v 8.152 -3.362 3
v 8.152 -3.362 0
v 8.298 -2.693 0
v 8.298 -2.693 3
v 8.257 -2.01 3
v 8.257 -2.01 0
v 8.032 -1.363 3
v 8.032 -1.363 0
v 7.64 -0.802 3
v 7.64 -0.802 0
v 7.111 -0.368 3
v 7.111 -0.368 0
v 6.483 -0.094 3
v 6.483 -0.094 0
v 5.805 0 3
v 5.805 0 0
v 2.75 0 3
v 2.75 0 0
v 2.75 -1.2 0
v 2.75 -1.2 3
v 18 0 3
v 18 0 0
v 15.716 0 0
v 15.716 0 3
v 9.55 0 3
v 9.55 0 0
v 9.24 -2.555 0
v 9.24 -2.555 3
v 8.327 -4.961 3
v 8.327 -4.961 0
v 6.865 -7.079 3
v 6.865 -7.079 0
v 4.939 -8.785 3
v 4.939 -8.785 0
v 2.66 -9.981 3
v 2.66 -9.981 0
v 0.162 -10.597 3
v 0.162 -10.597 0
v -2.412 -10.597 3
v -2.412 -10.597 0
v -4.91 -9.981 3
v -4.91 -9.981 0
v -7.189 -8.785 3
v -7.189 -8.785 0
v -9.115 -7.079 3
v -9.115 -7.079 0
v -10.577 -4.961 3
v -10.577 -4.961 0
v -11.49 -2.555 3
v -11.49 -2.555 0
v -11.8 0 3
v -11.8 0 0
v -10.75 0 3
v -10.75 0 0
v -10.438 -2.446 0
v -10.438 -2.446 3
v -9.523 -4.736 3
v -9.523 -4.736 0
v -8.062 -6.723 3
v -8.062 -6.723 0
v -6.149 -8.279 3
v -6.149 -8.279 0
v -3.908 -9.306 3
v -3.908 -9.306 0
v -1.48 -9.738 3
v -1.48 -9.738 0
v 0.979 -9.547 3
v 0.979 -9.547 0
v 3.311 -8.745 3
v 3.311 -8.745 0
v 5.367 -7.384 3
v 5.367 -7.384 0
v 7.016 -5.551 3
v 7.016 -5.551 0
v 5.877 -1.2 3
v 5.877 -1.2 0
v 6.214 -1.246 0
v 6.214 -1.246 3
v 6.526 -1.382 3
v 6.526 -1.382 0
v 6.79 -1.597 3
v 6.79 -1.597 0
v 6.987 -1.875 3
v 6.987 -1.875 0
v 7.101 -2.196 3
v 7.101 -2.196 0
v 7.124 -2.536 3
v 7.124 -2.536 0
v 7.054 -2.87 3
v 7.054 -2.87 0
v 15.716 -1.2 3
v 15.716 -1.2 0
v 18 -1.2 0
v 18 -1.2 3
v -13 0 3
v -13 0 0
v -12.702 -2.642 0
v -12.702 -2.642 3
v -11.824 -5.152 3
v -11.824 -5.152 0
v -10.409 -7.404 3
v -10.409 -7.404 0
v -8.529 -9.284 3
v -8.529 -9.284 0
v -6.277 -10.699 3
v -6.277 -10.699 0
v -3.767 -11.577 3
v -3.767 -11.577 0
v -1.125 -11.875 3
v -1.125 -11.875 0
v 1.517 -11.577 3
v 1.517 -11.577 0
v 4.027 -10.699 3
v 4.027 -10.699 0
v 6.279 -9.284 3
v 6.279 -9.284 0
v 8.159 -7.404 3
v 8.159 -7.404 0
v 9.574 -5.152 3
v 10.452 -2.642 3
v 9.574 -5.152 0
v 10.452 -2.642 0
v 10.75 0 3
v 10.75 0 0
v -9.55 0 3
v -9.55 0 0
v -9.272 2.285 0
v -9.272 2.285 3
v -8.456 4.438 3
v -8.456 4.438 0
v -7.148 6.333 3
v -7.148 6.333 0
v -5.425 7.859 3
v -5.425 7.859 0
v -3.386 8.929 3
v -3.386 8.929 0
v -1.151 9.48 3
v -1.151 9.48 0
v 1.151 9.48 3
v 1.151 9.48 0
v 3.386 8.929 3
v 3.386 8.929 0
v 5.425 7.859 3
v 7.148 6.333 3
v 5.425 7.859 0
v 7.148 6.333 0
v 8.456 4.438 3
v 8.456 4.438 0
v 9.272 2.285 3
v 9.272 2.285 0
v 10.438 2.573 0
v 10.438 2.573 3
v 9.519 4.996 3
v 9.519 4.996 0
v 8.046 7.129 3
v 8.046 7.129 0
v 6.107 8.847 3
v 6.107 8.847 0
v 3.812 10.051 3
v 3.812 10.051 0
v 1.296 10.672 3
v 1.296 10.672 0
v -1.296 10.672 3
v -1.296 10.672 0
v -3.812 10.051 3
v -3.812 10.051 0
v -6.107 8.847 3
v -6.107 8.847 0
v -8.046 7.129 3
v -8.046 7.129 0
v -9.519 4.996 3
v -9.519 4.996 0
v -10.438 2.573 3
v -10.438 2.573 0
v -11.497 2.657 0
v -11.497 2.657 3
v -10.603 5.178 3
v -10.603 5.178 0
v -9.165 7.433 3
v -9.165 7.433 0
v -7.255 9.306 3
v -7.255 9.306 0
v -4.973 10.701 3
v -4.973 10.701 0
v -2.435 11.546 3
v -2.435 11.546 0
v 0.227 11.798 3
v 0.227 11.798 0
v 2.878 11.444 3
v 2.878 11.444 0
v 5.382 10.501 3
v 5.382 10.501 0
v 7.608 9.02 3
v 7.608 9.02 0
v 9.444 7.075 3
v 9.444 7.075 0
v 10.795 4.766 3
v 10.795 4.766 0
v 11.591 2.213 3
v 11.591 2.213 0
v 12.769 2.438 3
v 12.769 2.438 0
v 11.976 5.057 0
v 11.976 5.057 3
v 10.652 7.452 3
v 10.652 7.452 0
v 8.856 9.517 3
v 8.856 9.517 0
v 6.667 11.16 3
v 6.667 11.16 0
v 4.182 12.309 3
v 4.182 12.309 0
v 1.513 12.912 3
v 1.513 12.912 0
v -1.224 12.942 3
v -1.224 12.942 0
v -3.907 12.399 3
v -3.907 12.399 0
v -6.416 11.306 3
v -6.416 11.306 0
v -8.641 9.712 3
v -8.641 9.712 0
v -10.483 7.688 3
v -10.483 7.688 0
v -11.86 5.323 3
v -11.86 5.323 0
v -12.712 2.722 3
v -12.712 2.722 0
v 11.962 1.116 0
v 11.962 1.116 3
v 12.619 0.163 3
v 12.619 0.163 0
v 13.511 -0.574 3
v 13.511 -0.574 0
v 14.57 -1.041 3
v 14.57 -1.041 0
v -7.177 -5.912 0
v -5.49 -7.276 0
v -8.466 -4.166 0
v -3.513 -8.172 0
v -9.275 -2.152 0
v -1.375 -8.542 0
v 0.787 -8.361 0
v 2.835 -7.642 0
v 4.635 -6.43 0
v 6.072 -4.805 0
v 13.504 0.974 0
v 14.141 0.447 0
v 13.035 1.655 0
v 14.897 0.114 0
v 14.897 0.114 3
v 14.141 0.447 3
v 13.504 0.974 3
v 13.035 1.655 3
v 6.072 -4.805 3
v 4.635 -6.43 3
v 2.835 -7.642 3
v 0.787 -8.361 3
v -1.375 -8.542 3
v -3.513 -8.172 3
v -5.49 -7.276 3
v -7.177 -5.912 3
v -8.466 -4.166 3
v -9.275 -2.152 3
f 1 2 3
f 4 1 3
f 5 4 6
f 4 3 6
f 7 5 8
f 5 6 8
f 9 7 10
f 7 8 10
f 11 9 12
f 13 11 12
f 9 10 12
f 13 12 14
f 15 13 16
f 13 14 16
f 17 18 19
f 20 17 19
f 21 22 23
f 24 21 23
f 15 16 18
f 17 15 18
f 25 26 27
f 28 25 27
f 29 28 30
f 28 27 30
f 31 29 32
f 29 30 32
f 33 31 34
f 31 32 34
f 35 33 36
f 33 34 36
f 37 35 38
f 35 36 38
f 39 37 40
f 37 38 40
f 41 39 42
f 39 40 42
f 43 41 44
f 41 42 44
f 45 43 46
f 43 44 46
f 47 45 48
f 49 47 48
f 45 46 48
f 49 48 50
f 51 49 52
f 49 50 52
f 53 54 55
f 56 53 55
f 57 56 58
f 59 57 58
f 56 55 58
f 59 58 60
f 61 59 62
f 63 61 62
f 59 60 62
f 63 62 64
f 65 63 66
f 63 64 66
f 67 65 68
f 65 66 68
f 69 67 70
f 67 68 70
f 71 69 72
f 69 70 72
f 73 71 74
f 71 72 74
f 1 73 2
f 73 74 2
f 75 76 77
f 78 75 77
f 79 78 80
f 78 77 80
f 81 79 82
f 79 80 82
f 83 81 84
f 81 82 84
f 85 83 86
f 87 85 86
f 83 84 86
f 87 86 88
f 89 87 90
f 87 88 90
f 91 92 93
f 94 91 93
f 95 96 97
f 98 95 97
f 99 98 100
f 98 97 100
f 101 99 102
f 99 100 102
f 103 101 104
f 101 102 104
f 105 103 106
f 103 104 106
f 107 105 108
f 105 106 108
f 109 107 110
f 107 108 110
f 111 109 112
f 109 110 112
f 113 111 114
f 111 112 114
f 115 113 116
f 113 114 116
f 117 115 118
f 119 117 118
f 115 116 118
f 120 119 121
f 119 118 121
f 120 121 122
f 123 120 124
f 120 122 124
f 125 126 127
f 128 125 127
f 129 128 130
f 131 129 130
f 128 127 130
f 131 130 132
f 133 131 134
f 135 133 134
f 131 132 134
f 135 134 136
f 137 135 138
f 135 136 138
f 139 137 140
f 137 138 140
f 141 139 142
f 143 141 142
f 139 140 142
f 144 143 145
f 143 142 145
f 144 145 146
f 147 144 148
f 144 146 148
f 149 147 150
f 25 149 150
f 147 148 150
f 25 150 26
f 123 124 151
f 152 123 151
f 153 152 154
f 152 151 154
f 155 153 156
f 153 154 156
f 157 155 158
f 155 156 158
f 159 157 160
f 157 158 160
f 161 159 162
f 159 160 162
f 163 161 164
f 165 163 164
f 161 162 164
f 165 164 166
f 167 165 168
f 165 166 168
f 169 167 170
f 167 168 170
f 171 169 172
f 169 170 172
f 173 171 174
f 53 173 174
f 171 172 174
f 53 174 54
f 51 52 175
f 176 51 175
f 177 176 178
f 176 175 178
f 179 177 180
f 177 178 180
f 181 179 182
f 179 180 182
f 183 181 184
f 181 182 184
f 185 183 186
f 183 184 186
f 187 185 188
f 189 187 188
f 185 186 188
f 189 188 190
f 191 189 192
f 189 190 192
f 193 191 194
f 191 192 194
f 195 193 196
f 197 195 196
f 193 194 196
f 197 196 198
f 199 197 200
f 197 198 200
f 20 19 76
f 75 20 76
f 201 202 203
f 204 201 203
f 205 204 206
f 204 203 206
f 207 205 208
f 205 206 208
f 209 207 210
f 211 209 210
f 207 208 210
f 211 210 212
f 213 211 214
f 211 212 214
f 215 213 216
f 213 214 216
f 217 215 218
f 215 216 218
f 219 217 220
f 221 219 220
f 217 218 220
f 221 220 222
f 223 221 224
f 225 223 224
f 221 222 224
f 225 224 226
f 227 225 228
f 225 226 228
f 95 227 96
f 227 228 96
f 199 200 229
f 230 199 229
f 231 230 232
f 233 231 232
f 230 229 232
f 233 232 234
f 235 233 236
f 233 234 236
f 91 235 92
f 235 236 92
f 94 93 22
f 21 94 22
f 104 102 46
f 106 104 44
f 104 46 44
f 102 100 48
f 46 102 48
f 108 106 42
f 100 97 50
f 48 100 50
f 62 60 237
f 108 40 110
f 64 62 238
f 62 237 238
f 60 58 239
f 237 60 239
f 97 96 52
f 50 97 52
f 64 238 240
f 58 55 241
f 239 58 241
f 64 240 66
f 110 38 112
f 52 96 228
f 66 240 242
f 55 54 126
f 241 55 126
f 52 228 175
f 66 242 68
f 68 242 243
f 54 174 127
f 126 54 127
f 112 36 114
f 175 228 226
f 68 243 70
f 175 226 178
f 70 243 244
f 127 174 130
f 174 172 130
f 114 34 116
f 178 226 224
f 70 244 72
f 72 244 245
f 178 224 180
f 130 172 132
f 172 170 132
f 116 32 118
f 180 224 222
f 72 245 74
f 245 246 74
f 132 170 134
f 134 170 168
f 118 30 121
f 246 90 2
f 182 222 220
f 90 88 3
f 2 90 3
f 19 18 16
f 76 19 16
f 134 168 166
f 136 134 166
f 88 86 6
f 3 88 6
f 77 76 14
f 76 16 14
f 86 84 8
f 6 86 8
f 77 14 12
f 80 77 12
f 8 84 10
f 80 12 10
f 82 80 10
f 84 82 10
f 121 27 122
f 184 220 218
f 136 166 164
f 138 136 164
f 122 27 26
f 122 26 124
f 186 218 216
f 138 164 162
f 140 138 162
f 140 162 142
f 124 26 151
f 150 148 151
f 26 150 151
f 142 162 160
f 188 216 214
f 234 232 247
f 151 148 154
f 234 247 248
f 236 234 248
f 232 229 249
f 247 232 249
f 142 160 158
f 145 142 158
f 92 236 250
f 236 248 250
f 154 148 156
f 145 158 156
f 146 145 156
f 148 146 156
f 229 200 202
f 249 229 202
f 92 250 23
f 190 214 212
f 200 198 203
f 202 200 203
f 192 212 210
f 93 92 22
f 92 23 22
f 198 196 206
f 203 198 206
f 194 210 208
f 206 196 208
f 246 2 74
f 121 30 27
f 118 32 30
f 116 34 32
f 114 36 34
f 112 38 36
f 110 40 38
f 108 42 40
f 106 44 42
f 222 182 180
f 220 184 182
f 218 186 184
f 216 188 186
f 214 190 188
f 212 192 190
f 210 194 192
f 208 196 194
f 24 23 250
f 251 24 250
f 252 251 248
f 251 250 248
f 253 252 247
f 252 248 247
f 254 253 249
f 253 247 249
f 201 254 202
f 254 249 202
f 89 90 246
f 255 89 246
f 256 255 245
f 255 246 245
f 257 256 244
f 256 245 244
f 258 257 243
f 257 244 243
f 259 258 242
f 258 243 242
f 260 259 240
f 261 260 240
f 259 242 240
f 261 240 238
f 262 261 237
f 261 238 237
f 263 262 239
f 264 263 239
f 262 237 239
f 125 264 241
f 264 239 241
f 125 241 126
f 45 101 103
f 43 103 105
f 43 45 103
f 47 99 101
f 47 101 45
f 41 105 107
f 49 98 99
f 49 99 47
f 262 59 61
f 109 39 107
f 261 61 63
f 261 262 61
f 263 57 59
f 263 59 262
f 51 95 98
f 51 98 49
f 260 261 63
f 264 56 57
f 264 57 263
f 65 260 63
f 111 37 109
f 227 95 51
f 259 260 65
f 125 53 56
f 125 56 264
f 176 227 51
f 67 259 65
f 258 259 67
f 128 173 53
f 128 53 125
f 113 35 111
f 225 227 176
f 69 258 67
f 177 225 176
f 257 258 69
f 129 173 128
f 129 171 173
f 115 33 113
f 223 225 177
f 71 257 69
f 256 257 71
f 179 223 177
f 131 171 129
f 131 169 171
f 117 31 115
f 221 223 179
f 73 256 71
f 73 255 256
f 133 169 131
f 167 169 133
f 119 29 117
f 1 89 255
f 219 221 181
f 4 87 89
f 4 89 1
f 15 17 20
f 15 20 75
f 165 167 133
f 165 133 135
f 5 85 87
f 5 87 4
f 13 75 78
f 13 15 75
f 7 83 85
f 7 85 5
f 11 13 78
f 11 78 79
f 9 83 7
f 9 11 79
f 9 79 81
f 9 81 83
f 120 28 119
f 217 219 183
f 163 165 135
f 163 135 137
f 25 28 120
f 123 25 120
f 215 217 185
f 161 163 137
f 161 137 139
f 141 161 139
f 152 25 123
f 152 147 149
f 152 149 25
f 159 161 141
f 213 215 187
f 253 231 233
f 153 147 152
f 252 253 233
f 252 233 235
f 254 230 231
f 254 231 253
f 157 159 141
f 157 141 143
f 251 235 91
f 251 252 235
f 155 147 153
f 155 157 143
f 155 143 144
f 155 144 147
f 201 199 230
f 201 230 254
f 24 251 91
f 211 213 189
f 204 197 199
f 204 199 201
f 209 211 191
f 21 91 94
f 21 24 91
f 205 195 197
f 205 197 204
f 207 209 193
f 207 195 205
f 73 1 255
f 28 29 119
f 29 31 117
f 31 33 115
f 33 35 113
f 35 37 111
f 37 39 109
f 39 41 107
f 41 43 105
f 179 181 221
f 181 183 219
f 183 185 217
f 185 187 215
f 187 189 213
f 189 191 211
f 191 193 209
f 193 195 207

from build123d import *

# Parameters (mm, degrees)
F1_DEPTH = 3


with BuildPart() as f1:
    # F0 (on Top) → F1 (new body)
    with BuildSketch(Plane.XY):
        with BuildLine():
            ThreePointArc((15.716234, 0), (13.804101, 0.688345), (12.76944, 2.4375))
            ThreePointArc((12.76944, 2.4375), (-1.22419, 12.942232), (-13, 0))
            ThreePointArc((-13, 0), (-1.125, -11.875), (10.75, 0))
            ThreePointArc((10.75, 0), (0, 10.75), (-10.75, 0))
            ThreePointArc((-10.75, 0), (-2.707419, -9.599334), (8.151994, -3.362069))
            ThreePointArc((8.151994, -3.362069), (7.85535, -1.069121), (5.805329, 0))
            Line((5.805329, 0), (2.75, 0))
            Line((2.75, 0), (2.75, -1.2))
            Line((2.75, -1.2), (5.876591, -1.2))
            ThreePointArc((5.876591, -1.2), (6.898085, -1.729549), (7.054089, -2.869521))
            ThreePointArc((7.054089, -2.869521), (-2.456028, -8.42511), (-9.55, 0))
            ThreePointArc((-9.55, 0), (0, 9.55), (9.55, 0))
            ThreePointArc((9.55, 0), (-1.125, -10.675), (-11.8, 0))
            ThreePointArc((-11.8, 0), (-1.111188, 11.747564), (11.590722, 2.2125))
            ThreePointArc((11.590722, 2.2125), (13.039248, -0.236317), (15.716234, -1.2))
            Line((15.716234, -1.2), (18, -1.2))
            Line((18, -1.2), (18, 0))
            Line((18, 0), (15.716234, 0))
        make_face()
    extrude(amount=F1_DEPTH)


solid = f1.part
